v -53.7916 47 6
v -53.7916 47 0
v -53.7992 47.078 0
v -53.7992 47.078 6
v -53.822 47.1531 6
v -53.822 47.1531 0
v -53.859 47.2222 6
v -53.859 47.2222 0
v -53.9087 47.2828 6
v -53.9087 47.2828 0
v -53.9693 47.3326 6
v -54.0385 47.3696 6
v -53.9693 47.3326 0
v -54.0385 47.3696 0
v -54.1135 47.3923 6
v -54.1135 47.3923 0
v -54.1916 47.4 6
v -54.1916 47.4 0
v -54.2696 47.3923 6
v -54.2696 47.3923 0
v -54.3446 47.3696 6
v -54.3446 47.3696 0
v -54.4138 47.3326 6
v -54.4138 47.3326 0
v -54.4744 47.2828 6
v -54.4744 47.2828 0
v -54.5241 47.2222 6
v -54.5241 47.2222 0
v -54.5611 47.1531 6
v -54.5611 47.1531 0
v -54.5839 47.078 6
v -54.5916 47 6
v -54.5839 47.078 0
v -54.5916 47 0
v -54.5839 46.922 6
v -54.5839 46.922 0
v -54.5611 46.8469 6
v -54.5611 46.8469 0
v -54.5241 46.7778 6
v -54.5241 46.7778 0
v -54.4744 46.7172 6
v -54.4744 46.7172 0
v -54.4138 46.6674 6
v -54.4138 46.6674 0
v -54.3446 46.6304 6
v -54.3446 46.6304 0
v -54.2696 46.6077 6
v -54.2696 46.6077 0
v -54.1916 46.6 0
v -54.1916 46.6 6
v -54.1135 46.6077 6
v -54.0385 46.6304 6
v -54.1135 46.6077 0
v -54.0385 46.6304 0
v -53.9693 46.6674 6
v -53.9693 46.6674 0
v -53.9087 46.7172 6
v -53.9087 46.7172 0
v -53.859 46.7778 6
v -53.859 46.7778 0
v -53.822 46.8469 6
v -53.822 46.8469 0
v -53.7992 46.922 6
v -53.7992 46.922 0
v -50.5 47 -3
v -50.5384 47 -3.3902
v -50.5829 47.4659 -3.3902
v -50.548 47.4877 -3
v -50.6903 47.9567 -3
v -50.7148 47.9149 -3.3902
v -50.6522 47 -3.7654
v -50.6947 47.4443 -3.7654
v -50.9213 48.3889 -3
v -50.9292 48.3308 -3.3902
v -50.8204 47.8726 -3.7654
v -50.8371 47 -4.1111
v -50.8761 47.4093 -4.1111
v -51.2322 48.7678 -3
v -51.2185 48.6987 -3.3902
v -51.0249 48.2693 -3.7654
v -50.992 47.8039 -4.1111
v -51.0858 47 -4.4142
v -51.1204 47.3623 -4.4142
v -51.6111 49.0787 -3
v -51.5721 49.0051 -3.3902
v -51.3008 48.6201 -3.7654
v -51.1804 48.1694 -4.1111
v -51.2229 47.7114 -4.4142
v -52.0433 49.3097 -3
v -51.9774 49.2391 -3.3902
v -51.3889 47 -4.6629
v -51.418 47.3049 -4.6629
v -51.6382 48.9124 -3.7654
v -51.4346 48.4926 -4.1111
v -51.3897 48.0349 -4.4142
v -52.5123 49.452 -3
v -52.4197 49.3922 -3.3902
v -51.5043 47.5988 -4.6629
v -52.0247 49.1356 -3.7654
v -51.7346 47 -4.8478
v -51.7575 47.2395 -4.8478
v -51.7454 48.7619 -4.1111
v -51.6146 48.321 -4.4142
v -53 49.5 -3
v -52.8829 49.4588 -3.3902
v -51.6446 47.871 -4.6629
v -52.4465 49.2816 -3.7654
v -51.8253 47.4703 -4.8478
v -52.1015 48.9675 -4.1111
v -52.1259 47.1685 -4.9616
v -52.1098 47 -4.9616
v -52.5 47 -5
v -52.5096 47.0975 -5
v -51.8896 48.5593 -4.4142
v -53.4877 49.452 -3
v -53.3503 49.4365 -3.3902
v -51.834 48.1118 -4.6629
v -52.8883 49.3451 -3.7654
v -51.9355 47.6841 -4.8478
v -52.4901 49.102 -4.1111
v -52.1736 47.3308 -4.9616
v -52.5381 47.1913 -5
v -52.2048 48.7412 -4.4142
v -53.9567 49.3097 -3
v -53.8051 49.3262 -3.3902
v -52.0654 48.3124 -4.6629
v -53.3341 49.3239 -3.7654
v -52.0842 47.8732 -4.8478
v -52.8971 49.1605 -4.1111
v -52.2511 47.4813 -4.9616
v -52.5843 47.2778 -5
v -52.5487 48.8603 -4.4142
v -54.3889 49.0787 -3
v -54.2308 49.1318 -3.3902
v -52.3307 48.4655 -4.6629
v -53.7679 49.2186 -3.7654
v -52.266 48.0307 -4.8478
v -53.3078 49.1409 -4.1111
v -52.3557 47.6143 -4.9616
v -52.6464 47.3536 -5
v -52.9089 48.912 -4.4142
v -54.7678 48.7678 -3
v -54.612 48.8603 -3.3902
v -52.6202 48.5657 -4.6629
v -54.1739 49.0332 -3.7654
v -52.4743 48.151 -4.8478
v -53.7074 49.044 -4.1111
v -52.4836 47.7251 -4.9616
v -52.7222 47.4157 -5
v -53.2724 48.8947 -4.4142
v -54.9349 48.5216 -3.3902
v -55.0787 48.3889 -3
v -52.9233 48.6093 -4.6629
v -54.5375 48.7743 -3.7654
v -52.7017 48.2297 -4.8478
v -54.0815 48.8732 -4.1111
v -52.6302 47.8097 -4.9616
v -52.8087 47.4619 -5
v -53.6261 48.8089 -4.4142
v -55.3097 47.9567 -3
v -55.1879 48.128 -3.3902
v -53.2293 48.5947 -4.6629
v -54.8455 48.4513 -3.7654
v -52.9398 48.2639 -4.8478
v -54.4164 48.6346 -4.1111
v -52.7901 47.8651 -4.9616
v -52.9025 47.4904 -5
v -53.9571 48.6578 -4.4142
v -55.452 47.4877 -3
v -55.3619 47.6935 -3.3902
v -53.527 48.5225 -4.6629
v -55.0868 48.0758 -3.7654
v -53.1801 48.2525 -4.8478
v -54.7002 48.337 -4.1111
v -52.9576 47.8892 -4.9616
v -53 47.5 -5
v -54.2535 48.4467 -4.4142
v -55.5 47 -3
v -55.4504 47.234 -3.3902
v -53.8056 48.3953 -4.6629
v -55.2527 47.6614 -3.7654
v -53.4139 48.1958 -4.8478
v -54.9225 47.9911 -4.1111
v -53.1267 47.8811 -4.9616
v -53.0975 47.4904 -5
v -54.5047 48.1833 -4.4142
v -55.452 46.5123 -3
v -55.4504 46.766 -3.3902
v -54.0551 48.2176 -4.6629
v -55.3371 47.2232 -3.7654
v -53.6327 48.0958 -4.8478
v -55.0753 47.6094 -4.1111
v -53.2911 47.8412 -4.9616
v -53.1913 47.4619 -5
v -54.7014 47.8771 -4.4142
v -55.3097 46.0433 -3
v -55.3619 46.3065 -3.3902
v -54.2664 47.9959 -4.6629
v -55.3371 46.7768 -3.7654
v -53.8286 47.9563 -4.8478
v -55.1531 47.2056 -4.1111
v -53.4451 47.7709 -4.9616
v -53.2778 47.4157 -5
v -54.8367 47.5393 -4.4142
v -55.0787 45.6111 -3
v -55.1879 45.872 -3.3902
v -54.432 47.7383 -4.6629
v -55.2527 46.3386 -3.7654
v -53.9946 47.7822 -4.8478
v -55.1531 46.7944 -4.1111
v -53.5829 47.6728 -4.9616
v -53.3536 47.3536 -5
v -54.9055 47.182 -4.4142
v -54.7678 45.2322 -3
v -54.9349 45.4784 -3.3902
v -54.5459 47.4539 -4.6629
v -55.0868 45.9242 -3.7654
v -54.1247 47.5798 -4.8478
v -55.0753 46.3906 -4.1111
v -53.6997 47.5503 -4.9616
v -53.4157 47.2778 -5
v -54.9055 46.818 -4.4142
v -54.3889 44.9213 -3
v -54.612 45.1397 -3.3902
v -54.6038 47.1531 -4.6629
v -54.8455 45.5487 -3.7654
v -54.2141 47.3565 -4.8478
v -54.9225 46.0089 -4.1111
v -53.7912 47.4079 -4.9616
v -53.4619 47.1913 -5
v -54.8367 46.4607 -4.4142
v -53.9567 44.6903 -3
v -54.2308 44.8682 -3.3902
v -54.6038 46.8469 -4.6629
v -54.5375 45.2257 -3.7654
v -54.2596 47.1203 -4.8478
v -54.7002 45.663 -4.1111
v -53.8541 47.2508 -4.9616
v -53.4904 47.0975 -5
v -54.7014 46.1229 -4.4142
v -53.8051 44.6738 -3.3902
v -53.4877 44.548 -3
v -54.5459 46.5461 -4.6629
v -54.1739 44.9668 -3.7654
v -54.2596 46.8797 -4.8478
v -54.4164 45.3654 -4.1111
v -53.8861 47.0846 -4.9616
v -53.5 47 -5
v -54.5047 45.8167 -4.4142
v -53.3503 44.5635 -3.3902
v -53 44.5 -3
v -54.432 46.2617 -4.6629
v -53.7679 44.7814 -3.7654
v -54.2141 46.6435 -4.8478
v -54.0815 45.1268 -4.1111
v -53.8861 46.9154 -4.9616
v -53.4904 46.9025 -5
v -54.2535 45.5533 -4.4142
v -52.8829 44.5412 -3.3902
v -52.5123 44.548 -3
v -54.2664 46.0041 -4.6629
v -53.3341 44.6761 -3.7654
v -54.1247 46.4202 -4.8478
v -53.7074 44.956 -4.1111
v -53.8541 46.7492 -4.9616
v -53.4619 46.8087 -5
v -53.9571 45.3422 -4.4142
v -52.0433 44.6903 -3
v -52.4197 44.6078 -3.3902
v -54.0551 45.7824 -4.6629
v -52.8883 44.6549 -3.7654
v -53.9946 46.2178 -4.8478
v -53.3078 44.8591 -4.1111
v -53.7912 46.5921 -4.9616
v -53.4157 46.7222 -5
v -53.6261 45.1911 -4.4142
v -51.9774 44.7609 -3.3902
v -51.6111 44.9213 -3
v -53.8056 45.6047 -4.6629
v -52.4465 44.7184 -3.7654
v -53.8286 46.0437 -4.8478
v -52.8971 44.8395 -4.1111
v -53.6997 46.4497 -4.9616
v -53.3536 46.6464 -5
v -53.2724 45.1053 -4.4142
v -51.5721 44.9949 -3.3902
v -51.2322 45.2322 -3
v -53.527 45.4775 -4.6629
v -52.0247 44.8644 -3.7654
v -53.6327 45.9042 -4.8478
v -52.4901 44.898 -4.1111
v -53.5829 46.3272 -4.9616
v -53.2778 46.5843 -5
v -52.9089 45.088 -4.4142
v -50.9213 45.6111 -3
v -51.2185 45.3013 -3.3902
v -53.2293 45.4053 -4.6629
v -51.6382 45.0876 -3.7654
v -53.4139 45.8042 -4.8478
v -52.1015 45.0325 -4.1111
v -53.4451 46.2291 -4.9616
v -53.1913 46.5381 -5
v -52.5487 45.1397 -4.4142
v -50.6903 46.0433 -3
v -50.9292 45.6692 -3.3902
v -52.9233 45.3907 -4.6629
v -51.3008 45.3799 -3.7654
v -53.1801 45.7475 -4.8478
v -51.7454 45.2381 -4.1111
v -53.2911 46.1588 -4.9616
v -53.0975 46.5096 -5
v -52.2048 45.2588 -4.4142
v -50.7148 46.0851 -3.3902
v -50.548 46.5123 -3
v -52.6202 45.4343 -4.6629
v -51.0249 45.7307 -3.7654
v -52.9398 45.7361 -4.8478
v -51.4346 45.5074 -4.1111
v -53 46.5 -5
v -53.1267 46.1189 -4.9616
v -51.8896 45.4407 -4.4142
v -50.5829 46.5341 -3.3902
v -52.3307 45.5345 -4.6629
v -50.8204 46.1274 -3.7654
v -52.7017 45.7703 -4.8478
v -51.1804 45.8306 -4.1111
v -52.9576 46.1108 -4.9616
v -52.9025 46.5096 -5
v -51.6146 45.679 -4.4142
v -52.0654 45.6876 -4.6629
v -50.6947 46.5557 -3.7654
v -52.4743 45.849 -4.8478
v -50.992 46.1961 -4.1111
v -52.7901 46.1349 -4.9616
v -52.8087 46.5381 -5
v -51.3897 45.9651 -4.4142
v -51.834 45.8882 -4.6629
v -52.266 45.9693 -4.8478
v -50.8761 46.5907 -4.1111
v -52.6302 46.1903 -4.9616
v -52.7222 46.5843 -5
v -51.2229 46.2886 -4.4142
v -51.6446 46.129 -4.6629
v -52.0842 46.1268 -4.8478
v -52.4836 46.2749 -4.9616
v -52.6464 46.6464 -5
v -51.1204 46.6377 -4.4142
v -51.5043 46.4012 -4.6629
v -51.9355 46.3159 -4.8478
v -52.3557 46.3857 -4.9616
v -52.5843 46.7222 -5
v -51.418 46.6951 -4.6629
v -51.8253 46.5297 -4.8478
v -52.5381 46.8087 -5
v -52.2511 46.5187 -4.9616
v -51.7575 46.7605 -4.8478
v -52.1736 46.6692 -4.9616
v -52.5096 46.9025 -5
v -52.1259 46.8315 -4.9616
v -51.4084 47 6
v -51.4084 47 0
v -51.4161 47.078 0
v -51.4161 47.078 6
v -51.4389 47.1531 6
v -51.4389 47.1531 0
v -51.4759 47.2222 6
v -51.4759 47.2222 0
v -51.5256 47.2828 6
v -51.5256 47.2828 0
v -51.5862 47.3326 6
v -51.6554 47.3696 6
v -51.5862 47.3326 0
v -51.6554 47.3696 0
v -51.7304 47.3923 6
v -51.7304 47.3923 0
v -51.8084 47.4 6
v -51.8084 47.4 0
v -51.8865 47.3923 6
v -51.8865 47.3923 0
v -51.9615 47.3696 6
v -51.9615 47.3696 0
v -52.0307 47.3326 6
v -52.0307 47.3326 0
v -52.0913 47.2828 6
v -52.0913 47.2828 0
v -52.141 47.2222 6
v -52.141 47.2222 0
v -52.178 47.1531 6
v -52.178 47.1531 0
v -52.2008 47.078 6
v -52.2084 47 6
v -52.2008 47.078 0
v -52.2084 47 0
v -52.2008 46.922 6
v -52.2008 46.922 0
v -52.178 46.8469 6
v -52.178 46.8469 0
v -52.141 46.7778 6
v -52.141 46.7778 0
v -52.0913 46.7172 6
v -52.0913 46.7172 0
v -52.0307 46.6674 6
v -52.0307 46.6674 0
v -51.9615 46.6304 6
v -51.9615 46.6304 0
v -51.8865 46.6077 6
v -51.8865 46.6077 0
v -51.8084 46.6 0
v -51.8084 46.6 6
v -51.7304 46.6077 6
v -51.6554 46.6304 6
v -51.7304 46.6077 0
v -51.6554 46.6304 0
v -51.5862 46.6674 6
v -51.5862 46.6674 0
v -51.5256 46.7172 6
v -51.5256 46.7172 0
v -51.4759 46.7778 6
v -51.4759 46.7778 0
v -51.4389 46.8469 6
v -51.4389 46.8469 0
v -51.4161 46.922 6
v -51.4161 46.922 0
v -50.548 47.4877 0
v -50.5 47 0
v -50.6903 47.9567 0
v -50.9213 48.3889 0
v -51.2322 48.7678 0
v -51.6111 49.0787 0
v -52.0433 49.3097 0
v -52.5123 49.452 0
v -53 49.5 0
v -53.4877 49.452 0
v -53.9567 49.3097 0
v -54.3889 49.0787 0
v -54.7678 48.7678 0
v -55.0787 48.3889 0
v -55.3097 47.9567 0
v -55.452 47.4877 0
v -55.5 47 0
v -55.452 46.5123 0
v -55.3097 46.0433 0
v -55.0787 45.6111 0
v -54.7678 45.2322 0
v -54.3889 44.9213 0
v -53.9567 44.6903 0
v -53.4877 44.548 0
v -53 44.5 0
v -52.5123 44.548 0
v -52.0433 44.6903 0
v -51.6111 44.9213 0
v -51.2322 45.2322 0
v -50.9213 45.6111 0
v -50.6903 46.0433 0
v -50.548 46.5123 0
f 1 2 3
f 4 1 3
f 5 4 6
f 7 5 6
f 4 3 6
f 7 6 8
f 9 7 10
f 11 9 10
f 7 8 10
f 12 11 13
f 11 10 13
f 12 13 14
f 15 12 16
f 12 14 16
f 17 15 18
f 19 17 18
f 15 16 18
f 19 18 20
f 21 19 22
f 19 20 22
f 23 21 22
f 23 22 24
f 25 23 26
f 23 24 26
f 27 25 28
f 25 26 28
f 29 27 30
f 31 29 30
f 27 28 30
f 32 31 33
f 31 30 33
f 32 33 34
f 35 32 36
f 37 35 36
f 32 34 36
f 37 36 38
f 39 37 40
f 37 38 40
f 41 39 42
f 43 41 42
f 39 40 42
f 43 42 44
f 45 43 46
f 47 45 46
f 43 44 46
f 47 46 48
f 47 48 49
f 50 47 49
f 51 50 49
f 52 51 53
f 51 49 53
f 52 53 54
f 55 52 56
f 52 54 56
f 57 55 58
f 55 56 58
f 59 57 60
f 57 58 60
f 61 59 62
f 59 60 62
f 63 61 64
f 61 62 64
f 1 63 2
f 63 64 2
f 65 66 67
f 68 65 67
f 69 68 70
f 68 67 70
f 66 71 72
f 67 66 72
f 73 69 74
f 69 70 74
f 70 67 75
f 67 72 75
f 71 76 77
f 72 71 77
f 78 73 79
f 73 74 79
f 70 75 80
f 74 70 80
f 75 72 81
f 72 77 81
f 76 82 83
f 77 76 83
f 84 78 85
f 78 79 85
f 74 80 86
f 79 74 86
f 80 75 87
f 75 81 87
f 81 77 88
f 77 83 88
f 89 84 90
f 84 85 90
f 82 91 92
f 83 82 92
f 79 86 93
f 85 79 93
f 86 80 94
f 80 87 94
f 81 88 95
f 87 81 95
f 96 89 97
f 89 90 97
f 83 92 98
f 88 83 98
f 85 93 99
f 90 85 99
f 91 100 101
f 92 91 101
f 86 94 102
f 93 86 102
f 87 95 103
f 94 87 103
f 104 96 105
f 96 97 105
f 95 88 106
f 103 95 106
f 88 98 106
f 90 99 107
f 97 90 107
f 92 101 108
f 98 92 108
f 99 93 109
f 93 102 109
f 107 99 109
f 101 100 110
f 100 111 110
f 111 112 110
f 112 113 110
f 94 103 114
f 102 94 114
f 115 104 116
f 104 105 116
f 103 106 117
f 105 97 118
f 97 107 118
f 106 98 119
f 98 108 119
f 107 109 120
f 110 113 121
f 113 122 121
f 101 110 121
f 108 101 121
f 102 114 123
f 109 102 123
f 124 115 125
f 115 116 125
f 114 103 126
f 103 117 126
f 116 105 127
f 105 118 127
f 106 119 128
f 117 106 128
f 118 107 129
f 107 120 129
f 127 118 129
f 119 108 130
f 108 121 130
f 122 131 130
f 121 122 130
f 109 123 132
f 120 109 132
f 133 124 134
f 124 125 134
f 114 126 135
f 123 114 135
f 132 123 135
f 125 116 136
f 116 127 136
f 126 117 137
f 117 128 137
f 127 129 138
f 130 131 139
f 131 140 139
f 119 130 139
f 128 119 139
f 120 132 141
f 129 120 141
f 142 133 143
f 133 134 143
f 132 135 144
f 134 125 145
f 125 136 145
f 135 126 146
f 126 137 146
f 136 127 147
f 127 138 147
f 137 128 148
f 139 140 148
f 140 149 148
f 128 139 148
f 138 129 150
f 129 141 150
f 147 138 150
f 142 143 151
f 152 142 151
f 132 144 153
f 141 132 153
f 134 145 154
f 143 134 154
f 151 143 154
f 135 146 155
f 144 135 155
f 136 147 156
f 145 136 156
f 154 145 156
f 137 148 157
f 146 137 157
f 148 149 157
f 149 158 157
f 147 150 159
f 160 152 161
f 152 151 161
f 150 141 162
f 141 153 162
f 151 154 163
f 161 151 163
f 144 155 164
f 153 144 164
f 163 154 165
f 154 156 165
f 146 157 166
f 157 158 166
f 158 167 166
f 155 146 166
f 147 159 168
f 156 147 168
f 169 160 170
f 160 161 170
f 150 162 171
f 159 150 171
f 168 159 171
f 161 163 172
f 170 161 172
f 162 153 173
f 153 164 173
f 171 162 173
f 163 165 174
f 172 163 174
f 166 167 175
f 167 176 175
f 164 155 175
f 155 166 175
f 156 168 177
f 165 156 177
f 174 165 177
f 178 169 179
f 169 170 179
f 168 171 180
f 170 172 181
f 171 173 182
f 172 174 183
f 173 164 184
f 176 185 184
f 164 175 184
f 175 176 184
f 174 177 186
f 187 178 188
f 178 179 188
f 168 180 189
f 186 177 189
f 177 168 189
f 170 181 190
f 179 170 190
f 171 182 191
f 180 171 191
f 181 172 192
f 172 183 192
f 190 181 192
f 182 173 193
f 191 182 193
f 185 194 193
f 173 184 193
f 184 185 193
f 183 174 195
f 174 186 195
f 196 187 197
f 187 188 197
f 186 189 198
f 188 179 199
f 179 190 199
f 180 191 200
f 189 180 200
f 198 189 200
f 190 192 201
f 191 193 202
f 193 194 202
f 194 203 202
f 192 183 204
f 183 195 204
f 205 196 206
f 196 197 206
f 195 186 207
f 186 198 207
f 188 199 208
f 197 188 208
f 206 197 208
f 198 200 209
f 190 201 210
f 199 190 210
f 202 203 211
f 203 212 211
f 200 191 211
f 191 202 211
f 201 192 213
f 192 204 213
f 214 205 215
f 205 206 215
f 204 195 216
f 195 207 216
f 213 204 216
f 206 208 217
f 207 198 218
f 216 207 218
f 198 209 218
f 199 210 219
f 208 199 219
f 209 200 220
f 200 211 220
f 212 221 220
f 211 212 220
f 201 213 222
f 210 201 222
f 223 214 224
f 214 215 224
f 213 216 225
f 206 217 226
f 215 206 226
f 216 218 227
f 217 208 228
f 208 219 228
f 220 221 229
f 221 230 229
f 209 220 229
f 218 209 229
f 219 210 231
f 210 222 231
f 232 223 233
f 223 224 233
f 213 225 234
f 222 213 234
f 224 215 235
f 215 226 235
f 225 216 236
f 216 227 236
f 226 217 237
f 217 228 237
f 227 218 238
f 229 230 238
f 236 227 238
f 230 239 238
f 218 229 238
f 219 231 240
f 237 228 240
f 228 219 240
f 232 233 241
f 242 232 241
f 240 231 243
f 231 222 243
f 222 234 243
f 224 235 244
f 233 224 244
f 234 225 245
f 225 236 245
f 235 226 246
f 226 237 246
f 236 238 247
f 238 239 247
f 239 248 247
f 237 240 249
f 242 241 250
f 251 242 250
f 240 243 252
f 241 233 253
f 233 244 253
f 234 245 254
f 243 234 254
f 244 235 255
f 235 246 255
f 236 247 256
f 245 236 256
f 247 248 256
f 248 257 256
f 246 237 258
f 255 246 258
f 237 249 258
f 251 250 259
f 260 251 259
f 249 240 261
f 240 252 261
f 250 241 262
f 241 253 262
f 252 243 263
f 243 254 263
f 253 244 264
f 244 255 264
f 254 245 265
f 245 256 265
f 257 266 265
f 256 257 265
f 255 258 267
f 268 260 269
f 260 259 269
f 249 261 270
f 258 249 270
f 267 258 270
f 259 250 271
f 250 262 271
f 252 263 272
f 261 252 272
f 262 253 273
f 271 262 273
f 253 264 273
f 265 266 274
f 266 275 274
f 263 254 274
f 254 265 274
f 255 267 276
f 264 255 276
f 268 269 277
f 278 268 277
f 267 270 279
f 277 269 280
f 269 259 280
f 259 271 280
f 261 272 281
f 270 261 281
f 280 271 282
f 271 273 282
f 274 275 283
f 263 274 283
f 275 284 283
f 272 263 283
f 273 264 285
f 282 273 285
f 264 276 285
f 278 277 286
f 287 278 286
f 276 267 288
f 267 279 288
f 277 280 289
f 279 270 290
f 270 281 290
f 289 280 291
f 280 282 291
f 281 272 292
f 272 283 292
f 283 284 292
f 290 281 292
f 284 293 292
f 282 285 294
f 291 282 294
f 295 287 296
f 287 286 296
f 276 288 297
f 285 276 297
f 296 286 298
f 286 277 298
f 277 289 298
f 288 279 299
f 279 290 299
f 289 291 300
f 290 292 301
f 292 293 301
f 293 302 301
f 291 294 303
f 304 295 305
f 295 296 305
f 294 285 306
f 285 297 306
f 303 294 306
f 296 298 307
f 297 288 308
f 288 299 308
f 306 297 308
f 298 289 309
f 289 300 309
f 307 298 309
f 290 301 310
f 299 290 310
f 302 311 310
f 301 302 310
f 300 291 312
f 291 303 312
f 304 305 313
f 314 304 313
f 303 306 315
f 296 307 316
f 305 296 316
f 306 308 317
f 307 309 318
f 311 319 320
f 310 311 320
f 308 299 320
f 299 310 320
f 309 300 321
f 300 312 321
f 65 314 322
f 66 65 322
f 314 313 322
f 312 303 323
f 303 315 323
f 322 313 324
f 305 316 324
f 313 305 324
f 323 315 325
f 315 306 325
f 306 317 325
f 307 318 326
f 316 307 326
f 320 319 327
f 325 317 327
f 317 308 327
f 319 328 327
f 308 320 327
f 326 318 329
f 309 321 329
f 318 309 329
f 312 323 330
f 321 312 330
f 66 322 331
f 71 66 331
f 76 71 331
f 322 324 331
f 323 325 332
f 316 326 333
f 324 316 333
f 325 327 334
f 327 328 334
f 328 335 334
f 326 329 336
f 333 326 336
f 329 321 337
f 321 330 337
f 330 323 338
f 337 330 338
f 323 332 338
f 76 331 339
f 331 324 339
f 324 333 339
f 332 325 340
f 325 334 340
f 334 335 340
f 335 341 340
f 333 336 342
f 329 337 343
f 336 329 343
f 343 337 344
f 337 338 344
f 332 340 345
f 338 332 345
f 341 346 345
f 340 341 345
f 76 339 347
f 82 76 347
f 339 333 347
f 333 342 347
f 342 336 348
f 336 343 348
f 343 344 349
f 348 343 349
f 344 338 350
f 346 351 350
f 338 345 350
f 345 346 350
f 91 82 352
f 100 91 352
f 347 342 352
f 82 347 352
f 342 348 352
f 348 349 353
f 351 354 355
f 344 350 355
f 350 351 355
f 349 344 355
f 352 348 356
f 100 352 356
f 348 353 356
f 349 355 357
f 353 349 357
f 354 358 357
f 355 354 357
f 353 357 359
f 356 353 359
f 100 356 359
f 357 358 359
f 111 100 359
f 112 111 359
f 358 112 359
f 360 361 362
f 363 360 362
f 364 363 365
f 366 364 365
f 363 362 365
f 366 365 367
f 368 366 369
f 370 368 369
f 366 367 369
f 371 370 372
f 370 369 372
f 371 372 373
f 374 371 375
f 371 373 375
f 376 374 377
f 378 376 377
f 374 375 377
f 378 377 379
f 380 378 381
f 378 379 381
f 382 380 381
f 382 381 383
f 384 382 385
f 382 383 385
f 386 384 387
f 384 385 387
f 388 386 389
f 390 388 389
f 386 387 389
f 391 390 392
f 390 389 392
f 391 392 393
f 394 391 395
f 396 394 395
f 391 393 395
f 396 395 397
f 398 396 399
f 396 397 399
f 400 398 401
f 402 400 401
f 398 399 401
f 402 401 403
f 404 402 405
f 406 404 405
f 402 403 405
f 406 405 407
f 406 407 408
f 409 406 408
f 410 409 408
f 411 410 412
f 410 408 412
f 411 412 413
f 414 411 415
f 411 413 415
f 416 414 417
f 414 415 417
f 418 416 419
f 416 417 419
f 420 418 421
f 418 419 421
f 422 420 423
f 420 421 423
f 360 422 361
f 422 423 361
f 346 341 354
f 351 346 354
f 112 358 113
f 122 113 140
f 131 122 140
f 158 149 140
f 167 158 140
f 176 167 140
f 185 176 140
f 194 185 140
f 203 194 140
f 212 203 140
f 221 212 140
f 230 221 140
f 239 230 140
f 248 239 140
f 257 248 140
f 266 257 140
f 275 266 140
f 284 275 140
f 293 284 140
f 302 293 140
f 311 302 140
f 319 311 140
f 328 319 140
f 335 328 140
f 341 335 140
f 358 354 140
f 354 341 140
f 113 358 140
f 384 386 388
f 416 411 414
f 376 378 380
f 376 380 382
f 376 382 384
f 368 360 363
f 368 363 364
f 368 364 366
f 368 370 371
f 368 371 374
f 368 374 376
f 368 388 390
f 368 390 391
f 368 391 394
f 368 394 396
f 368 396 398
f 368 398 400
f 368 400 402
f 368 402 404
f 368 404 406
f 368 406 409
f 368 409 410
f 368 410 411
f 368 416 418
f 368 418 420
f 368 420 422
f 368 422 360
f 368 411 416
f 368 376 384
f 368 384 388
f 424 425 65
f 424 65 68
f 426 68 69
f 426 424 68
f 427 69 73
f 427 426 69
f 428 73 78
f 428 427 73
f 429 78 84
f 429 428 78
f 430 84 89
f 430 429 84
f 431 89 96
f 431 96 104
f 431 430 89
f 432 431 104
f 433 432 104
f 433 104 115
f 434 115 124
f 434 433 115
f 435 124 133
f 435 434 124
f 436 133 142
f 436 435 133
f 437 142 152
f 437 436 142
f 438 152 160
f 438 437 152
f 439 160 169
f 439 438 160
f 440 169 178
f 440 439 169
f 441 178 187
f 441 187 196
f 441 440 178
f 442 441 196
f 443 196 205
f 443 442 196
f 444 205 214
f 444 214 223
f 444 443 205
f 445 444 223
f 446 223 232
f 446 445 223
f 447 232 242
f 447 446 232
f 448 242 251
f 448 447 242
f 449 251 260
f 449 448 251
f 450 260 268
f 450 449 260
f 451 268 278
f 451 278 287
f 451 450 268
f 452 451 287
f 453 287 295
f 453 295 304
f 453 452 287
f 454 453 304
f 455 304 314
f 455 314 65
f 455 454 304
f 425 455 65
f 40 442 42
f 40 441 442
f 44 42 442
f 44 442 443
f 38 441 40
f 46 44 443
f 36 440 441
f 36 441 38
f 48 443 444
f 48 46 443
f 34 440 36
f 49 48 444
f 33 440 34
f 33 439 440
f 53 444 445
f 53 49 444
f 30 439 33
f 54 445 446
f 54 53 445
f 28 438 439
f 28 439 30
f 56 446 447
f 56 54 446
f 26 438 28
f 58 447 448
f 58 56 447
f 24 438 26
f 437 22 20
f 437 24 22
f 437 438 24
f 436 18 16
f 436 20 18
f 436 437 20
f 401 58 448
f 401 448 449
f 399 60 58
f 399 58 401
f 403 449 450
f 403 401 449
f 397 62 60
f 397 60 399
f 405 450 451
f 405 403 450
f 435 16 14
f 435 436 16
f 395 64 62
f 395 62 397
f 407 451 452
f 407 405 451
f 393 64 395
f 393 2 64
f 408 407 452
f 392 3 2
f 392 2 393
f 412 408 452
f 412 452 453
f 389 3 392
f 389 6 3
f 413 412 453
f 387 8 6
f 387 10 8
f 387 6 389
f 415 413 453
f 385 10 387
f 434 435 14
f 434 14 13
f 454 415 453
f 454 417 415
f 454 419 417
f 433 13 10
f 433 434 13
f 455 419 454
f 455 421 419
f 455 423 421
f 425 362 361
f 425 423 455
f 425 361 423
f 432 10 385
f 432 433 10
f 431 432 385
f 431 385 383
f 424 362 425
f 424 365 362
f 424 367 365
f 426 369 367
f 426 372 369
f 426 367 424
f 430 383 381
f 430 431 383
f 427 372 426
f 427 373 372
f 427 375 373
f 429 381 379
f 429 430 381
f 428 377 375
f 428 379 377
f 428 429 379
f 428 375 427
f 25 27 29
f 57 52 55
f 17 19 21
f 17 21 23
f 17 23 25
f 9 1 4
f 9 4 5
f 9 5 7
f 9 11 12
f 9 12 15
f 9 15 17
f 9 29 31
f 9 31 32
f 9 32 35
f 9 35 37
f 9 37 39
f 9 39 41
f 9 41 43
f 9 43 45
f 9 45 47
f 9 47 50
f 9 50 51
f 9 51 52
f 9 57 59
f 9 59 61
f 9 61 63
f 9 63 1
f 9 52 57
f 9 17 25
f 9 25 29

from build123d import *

# Parameters (mm, degrees)
SKETCH1_R           = 2.5
BOSS_EXTRUDE1_DEPTH = 5
SKETCH2_R           = 0.4
BOSS_EXTRUDE2_DEPTH = 6
FILLET1_R           = 2


with BuildPart() as part:
    # Sketch1 → Boss-Extrude1 (new body)
    with BuildSketch(Plane.XY):
        with Locations((-53, 47)):
            Circle(SKETCH1_R)
    extrude(amount=-BOSS_EXTRUDE1_DEPTH)

    # Sketch2 → Boss-Extrude2 (add)
    with BuildSketch(Plane.XY):
        with Locations((-54.191552133, 47)):
            Circle(SKETCH2_R)
        with Locations((-51.808447867, 47)):
            Circle(SKETCH2_R)
    extrude(amount=BOSS_EXTRUDE2_DEPTH)

    # Fillet1
    fillet1_edges = [part.edges().sort_by_distance(p)[0] for p in [
        (-55.5, 47, -5),
    ]]
    fillet(fillet1_edges, radius=FILLET1_R)


solid = part.part
